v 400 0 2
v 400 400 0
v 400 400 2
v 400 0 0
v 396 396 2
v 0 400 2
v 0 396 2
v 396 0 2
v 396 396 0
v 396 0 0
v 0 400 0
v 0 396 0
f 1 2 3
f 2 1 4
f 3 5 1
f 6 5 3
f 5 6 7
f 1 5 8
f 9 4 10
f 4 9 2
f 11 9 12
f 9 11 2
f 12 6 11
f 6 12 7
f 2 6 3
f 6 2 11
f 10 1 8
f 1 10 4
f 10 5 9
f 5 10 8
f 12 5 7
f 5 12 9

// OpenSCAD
thick = 2;
difference() {
    cube([400,400,2]);
    cube([400-2*thick,400-2*thick,2]);
}
